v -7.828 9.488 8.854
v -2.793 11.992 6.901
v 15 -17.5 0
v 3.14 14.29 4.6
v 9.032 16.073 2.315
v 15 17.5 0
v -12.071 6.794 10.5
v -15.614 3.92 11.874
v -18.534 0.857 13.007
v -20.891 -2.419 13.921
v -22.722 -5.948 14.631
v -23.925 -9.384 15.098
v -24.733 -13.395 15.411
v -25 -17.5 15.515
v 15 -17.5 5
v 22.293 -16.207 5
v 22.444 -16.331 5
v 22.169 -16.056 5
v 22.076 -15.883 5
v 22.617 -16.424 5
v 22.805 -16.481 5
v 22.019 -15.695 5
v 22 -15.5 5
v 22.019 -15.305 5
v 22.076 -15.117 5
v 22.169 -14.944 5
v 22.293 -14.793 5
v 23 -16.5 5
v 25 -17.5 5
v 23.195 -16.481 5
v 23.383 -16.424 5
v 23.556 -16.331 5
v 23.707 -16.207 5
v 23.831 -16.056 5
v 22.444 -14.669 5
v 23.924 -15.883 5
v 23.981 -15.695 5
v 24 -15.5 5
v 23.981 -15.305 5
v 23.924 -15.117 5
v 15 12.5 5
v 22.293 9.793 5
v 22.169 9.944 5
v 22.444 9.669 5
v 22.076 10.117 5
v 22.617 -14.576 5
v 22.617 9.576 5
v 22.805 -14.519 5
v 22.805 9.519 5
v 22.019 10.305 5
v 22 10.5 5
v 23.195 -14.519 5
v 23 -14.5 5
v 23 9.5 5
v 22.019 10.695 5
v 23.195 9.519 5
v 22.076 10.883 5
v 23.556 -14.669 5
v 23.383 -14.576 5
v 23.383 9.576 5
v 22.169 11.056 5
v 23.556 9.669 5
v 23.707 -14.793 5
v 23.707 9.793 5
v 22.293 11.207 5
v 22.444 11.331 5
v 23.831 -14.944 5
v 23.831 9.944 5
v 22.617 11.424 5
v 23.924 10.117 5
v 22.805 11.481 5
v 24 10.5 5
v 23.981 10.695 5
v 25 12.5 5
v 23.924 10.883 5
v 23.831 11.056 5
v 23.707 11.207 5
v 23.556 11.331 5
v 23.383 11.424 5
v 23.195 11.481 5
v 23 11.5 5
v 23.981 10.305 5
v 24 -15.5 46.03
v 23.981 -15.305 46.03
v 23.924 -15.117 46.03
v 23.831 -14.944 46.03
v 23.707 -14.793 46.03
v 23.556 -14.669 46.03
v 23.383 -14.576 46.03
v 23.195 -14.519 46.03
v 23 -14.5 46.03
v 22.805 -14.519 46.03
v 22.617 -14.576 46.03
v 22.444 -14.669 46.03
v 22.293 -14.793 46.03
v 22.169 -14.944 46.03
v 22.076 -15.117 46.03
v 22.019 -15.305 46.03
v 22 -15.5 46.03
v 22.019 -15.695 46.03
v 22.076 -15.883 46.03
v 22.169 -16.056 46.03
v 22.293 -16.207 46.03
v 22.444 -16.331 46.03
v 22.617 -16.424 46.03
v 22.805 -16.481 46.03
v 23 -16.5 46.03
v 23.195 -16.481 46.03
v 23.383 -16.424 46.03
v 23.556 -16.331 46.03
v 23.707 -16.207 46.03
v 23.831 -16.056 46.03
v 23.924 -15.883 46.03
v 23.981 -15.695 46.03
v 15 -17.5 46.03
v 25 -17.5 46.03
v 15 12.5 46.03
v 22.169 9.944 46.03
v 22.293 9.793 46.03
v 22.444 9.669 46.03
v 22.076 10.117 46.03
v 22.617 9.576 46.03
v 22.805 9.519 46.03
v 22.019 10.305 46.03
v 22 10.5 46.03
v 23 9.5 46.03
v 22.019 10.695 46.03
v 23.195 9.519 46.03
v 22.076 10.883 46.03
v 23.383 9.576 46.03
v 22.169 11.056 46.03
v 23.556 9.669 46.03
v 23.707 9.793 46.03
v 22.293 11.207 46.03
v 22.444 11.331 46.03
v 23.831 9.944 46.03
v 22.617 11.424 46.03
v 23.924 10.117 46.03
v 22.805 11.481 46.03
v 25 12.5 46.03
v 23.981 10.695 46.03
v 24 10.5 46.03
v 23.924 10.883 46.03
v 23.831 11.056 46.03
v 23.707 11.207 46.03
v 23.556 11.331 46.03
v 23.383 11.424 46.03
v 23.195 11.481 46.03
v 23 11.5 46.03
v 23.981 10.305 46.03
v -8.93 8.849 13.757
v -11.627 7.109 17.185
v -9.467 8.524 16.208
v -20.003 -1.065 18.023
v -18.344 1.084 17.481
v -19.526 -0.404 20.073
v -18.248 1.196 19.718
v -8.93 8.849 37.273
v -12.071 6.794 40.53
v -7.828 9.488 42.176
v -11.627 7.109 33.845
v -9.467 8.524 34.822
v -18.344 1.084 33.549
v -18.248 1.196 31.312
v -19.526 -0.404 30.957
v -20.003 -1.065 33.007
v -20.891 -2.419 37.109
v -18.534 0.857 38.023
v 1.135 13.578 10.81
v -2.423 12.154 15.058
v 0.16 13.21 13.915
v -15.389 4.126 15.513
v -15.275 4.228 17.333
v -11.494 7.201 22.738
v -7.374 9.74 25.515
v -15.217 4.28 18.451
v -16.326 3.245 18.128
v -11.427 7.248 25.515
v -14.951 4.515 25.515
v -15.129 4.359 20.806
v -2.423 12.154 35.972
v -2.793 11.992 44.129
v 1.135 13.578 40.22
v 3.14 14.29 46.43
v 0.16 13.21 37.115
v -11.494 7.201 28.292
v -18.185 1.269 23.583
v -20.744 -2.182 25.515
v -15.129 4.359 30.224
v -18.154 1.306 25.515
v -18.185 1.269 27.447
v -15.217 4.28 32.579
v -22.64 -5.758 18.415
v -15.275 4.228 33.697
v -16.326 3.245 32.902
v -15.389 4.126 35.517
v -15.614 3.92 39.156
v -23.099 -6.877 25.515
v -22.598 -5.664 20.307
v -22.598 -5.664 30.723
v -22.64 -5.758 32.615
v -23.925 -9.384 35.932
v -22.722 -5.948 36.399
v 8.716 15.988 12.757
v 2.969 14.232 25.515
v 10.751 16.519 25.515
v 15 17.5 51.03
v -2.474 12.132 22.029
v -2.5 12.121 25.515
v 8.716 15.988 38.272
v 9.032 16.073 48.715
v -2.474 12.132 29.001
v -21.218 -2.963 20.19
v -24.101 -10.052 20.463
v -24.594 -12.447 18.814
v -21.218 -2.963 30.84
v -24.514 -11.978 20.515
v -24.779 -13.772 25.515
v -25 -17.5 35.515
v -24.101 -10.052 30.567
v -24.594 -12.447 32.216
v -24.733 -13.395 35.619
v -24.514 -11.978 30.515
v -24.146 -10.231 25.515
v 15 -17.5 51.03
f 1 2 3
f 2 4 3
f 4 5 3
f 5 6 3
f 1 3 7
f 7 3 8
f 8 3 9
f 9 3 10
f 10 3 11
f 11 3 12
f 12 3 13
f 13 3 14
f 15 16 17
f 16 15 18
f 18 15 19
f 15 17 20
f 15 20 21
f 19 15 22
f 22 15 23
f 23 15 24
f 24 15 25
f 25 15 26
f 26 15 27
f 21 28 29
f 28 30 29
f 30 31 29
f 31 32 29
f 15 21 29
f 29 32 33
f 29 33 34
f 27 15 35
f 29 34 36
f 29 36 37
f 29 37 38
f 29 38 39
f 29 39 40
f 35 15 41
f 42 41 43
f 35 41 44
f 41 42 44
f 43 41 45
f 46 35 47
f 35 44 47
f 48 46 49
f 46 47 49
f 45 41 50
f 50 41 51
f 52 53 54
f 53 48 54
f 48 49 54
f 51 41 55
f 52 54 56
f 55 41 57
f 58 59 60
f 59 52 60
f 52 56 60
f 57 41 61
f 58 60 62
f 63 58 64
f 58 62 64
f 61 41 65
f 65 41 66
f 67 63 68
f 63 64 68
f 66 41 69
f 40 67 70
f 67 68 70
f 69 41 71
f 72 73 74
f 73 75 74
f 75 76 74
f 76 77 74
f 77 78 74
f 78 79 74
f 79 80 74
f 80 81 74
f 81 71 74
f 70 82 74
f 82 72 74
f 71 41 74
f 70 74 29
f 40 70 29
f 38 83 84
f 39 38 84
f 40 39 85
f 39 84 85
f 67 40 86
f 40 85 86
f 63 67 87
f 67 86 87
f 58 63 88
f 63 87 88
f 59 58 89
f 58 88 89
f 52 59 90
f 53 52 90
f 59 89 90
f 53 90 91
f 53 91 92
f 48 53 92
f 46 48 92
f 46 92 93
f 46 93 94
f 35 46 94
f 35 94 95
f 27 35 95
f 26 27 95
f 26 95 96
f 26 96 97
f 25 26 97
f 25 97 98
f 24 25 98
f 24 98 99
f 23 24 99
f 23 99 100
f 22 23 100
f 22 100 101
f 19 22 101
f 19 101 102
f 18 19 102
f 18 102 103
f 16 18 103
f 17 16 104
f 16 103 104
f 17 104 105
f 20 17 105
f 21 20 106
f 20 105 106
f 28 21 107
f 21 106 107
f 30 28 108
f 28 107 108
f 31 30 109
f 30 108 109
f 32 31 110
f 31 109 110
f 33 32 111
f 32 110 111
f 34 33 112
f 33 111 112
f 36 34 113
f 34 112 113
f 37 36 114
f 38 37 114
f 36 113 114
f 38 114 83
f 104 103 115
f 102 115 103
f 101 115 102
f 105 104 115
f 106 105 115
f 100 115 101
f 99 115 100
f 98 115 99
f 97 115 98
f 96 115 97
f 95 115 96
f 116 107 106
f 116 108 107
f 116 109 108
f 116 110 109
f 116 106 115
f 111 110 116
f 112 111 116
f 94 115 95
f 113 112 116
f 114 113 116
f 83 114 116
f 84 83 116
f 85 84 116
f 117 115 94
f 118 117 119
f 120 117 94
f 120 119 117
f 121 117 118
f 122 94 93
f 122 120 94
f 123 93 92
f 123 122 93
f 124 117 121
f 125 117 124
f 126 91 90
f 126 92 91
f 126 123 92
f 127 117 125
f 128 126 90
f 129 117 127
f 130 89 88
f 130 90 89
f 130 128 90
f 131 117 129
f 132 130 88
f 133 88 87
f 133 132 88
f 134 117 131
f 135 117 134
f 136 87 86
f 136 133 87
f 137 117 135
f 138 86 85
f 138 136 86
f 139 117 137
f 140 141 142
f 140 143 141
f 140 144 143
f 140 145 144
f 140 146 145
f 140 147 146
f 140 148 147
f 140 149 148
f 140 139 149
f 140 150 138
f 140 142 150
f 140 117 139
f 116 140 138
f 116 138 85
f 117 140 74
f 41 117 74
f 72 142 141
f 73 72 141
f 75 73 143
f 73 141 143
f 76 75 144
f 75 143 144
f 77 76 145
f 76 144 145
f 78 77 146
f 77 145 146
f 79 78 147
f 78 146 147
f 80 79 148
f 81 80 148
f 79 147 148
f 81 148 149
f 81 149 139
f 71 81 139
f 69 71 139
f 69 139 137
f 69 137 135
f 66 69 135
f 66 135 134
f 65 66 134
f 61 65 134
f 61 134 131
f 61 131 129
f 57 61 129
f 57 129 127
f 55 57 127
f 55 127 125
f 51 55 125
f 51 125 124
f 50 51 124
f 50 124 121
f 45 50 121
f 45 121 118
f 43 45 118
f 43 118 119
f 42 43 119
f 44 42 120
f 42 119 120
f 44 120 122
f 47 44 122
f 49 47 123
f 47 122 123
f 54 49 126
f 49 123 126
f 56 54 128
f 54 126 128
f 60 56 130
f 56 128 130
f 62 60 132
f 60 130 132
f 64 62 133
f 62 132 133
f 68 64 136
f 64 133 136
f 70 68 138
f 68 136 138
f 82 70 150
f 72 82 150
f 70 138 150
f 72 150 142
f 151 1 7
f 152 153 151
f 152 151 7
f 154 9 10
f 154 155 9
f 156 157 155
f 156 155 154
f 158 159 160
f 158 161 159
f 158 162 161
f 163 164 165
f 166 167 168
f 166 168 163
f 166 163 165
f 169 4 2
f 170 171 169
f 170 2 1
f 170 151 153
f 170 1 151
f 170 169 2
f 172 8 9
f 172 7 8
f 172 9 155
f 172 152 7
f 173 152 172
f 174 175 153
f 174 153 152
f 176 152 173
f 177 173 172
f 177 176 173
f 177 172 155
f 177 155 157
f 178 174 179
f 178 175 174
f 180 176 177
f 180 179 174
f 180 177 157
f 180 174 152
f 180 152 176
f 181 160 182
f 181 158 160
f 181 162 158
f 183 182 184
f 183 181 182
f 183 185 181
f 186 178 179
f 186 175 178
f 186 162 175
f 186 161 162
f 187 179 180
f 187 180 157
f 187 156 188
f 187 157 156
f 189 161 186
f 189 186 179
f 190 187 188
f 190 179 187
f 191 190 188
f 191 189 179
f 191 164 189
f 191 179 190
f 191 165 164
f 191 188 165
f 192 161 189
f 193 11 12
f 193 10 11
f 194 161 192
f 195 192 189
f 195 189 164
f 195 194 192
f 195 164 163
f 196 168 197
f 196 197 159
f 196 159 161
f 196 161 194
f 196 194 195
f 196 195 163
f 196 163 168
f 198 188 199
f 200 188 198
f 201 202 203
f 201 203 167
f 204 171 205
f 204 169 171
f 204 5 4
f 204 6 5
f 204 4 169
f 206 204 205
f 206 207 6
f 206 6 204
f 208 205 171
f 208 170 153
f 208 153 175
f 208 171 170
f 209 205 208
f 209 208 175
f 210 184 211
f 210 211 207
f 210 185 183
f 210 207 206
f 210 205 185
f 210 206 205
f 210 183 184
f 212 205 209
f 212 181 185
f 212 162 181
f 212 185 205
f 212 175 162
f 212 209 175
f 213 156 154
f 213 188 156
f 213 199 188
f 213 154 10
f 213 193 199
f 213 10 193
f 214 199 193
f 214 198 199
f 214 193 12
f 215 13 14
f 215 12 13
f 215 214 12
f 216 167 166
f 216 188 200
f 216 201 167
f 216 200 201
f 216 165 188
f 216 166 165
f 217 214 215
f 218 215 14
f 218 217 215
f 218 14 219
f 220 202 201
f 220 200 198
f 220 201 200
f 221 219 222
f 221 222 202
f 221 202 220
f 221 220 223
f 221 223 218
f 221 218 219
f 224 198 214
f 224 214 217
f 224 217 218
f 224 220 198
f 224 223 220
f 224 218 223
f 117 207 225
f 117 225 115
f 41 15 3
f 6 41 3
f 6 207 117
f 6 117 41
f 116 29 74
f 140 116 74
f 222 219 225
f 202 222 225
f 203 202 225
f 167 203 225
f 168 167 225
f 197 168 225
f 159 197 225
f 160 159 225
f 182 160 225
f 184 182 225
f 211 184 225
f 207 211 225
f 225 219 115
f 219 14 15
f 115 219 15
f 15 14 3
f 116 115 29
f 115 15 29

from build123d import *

# Parameters (mm, degrees)
SKETCH_1_W           = 50
SKETCH_1_H           = 35
EXTRUDE_1_DEPTH      = 51.03
SKETCH_2_W           = 10
SKETCH_2_H           = 5
CUT_EXTRUDE_1_DEPTH  = 51.03
CUT_EXTRUDE_16_DEPTH = 60.458480472
CUT_EXTRUDE_17_DEPTH = 67.738751278
SKETCH_13_W          = 41.03
SKETCH_13_H          = 5
CUT_EXTRUDE_18_DEPTH = 10
SKETCH_14_R          = 1
CUT_EXTRUDE_19_DEPTH = 56.22690393


with BuildPart() as part:
    # 草图1 → 凸台-拉伸1 (new body)
    with BuildSketch(Plane.XY):
        Rectangle(SKETCH_1_W, SKETCH_1_H)
    extrude(amount=EXTRUDE_1_DEPTH)

    # 草图2 → 切除-拉伸1 (cut)
    with BuildSketch(Plane(origin=(0, 17.5, 0), x_dir=(1, 0, 0), z_dir=(0, 1, 0))):
        with Locations((20, -2.5)):
            Rectangle(SKETCH_2_W, SKETCH_2_H)
        with Locations((20, -48.53)):
            Rectangle(SKETCH_2_W, SKETCH_2_H)
    extrude(amount=-CUT_EXTRUDE_1_DEPTH, mode=Mode.SUBTRACT)

    # 草图3 → 切除-拉伸16 (cut, through all)
    with BuildSketch(Plane.XY.offset(51.03)):
        with BuildLine():
            add(Edge.make_bspline(
                [(15, 17.5), (-24.901617215, 9.03072155), (-25, -17.5)],
                knots=[0, 0, 0, 0.995080861, 0.995080861, 0.995080861], degree=2))
            Line((15, 17.5), (-25, 17.5))
            Line((-25, 17.5), (-25, -17.5))
        make_face()
    extrude(amount=-CUT_EXTRUDE_16_DEPTH, mode=Mode.SUBTRACT)

    # 草图11 → 切除-拉伸17 (cut, through all)
    with BuildSketch(Plane.XZ.offset(17.5)):
        Polygon((-25, 35.515), (15, 51.03), (-25, 51.03), align=None)
        Polygon((-25, 0), (15, 0), (-25, 15.515), align=None)
    extrude(amount=-CUT_EXTRUDE_17_DEPTH, mode=Mode.SUBTRACT)

    # 草图13 → 切除-拉伸18 (cut)
    with BuildSketch(Plane(origin=(25, 0, 0), x_dir=(0, 0, -1), z_dir=(1, 0, 0))):
        with Locations((-25.515, 15)):
            Rectangle(SKETCH_13_W, SKETCH_13_H)
    extrude(amount=-CUT_EXTRUDE_18_DEPTH, mode=Mode.SUBTRACT)

    # 草图14 → 切除-拉伸19 (cut, through all)
    with BuildSketch(Plane.XY.offset(46.03)):
        with Locations((23, 10.5)):
            Circle(SKETCH_14_R)
        with Locations((23, -15.5)):
            Circle(SKETCH_14_R)
    extrude(amount=-CUT_EXTRUDE_19_DEPTH, mode=Mode.SUBTRACT)


solid = part.part
